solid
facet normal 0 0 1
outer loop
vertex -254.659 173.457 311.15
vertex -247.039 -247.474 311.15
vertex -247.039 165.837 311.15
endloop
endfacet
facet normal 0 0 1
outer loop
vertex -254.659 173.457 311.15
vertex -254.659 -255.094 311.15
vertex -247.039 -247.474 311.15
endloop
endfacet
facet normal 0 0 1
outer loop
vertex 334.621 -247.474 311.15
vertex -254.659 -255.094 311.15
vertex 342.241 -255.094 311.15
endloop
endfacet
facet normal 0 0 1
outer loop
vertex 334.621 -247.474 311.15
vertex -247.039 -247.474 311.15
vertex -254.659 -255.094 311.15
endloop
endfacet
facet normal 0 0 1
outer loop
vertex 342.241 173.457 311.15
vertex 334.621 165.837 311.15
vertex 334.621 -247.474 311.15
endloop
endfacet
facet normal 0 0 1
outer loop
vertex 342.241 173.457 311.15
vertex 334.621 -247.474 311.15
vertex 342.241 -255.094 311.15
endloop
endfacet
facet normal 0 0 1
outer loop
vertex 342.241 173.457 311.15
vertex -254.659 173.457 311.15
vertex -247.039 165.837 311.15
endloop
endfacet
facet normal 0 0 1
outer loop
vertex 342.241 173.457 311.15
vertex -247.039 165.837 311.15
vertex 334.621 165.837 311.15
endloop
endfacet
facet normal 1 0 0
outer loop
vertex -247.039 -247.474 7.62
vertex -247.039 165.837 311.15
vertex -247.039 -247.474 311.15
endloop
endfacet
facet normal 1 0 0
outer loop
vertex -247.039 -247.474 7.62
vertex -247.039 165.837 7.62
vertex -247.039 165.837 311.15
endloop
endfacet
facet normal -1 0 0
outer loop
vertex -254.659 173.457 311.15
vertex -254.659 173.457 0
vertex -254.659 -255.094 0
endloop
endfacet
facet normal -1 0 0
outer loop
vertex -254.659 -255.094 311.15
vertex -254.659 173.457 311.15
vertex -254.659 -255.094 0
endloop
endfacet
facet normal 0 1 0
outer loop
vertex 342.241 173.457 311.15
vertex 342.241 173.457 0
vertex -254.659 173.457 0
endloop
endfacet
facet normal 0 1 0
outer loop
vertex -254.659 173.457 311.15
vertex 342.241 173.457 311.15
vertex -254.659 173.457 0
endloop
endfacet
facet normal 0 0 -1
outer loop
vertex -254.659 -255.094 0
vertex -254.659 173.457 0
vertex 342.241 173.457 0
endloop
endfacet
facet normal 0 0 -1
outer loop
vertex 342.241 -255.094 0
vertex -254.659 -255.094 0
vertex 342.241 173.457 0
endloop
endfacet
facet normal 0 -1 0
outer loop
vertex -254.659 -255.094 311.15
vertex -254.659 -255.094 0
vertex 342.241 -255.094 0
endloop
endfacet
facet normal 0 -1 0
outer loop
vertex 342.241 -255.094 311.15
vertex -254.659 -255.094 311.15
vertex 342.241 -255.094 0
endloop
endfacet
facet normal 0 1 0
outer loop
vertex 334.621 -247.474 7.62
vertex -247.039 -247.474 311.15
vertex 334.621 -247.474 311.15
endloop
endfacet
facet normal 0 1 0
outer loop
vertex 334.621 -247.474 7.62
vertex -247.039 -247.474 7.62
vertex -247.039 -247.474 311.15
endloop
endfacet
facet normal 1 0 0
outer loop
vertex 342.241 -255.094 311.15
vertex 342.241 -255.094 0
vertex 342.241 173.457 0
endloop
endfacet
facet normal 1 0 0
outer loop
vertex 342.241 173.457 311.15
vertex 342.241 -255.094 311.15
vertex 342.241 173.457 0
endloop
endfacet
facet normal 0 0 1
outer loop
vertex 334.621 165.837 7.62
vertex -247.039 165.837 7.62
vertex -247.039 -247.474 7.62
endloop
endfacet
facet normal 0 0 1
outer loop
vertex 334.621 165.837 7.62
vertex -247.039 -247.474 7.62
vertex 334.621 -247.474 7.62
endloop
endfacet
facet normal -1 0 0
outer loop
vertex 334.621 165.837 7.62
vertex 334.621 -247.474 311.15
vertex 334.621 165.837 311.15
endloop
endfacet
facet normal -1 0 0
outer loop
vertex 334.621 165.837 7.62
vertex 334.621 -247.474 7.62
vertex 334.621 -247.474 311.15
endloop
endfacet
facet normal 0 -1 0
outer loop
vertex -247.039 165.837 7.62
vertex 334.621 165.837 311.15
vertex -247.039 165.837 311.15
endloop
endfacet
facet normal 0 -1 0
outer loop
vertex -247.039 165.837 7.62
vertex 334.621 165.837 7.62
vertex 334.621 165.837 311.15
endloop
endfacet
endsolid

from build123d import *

# Parameters (mm, degrees)
F1_DEPTH = 311.15
F2_T     = -7.62


# Not quite as in the source:
# - a feature names something its author has since deleted; it is built from what else it names


with BuildPart() as f1:
    # F0 (on Top) → F1 (new body)
    with BuildSketch(Plane.XY):
        Polygon((342.2408003828, -255.094484383), (342.2408003828, 173.456788063), (-254.6591996172, 173.456788063), (-254.6591996172, -197.8495568037), (-254.6591996172, -255.094484383), (334.2911142349, -255.094484383), align=None)
    extrude(amount=F1_DEPTH)

    # F2
    f2_openings = [f1.faces().sort_by_distance(p)[0] for p in [
        (43.7908, -40.818848, 311.15),
    ]]
    offset(amount=F2_T, openings=f2_openings)


solid = f1.part
